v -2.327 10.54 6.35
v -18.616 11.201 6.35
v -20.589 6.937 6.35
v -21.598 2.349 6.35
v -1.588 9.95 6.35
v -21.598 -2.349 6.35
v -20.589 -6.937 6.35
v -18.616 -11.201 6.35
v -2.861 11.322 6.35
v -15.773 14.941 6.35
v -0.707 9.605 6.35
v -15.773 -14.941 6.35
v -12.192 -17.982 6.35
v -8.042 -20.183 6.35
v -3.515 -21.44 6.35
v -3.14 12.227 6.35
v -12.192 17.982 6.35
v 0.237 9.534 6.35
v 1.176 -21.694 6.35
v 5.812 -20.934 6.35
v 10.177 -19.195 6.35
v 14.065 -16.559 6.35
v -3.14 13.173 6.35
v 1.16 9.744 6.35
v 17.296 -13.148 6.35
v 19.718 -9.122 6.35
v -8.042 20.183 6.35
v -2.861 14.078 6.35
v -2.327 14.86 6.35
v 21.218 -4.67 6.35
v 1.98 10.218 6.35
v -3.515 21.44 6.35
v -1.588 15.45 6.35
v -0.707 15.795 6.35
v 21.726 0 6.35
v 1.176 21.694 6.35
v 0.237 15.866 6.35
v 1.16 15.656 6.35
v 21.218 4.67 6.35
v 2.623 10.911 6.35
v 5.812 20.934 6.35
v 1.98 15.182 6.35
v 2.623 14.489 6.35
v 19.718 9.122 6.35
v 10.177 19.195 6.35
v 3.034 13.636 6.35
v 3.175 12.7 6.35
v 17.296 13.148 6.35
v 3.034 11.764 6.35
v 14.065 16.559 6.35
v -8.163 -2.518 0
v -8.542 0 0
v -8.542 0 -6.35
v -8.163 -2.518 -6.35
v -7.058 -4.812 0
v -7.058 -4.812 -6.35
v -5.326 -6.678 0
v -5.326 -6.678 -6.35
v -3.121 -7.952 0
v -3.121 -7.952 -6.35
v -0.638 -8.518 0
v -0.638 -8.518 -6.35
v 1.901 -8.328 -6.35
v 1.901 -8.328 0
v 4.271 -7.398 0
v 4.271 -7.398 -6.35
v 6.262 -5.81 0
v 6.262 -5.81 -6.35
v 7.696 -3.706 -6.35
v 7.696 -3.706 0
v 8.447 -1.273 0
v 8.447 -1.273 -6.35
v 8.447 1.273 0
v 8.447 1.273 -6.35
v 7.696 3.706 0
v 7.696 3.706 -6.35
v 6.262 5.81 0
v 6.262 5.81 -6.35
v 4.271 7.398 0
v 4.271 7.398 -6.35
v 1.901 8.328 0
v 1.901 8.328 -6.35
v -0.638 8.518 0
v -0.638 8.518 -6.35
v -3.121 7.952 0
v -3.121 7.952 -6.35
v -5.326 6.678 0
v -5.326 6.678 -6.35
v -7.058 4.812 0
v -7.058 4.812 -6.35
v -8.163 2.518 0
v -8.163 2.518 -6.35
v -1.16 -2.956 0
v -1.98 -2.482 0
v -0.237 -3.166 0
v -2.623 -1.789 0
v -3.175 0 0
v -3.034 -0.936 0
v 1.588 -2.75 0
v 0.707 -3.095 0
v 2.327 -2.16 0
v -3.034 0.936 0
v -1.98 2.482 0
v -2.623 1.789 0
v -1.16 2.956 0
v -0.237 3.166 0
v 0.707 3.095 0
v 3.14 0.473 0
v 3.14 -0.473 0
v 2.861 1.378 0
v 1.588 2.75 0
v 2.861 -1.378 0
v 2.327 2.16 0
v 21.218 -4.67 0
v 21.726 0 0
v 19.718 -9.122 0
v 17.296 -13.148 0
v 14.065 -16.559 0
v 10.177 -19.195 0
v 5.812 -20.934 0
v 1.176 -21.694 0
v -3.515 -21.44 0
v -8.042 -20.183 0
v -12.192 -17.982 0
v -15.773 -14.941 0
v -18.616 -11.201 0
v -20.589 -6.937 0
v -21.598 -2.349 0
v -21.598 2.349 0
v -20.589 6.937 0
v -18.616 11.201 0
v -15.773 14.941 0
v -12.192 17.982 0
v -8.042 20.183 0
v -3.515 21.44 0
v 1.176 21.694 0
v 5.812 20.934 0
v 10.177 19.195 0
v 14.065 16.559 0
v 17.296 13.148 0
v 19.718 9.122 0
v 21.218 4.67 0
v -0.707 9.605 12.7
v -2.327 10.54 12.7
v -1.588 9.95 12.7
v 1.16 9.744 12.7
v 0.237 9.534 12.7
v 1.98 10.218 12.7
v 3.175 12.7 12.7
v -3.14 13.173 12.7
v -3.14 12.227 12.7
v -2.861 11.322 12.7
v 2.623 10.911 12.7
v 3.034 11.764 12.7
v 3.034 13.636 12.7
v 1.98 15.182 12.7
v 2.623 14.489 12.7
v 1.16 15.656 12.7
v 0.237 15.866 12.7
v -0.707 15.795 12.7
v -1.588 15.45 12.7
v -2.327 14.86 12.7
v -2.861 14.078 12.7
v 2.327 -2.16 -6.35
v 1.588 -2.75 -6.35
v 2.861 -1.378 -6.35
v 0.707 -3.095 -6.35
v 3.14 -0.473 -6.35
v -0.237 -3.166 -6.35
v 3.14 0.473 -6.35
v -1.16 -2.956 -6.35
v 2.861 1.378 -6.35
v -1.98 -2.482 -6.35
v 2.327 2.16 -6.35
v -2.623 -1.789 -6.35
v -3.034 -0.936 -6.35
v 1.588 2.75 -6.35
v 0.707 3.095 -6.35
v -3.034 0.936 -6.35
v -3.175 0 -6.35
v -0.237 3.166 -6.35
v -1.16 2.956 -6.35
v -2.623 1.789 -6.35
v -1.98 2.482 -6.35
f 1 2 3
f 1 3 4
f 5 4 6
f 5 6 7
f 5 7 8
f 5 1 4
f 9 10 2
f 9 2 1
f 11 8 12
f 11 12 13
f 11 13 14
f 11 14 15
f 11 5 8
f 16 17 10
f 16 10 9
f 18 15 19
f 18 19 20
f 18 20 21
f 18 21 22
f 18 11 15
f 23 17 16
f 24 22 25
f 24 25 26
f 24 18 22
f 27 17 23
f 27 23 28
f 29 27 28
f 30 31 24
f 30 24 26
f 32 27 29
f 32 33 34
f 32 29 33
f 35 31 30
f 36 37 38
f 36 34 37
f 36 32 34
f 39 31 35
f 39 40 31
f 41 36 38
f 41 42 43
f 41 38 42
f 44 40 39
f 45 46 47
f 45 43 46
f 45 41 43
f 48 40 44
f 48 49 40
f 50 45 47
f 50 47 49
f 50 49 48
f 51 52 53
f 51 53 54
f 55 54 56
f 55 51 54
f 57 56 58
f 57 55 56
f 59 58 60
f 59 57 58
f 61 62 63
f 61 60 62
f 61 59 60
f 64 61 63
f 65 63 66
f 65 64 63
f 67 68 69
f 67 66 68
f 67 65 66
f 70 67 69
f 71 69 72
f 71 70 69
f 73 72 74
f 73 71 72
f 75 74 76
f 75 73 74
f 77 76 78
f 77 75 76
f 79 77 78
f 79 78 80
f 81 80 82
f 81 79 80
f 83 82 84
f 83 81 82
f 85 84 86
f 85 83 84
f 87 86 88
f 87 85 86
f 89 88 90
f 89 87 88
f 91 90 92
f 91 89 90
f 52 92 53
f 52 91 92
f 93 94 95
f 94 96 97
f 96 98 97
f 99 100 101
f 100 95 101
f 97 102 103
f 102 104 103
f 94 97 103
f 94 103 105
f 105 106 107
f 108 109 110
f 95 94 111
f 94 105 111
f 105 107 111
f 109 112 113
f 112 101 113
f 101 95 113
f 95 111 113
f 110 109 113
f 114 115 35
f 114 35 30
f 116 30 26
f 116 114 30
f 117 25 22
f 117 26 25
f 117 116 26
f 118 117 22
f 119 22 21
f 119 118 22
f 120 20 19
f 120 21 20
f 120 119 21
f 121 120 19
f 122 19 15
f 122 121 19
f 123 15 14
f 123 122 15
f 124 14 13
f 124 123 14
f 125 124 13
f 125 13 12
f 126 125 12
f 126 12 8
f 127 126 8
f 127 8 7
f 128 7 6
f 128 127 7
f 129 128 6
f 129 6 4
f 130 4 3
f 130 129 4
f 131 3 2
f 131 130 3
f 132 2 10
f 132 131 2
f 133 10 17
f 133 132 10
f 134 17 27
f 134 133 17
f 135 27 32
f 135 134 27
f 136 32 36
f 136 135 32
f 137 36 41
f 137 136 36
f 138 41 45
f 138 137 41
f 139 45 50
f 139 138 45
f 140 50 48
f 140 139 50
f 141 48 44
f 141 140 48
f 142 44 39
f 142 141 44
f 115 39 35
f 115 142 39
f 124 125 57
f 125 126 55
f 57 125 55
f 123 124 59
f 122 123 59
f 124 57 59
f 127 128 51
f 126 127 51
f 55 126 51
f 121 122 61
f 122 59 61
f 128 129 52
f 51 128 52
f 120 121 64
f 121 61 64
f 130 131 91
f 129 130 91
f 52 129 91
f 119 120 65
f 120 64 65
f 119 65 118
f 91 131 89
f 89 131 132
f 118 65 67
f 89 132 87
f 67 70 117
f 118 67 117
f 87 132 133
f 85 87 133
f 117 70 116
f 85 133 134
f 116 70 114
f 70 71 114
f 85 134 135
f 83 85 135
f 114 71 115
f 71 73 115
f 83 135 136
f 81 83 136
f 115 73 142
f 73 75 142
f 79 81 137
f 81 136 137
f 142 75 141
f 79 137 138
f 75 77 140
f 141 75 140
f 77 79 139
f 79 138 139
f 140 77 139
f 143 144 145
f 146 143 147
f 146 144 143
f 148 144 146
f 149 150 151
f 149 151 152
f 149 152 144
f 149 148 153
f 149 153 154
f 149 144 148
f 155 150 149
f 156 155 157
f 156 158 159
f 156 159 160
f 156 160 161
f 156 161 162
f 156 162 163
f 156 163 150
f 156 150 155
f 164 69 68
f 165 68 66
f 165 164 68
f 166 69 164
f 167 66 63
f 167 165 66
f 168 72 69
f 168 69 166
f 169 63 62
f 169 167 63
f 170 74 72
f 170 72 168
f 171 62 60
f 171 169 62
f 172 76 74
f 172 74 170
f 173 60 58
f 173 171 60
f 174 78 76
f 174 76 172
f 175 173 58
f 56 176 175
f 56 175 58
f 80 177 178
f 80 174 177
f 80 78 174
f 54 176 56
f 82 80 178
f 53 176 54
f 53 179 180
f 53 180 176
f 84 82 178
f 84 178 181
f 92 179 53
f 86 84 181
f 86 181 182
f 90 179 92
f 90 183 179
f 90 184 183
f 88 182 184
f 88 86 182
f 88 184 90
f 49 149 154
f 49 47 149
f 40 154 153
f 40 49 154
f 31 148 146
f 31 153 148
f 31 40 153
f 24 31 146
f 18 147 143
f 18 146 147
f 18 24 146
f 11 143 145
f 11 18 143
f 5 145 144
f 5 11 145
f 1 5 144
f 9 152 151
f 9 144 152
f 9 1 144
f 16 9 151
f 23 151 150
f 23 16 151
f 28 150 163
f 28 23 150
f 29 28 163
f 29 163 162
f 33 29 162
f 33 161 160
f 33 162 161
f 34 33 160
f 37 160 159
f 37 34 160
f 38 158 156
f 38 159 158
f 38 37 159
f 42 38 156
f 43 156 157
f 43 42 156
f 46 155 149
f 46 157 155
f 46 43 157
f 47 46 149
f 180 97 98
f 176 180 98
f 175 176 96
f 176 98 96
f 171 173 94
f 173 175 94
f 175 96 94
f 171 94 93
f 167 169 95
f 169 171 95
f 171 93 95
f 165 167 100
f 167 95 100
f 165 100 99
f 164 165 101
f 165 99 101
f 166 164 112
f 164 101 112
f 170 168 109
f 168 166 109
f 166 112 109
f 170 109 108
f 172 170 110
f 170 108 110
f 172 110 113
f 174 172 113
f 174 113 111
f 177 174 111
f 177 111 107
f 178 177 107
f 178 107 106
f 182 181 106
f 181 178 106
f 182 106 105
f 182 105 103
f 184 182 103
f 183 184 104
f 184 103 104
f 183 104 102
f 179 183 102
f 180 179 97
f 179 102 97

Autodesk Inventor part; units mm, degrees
ref_plane "XZ Plane" through (0, 0, 0) normal (0, 1, 0) x (-1, 0, 0)
ref_plane "XY Plane" through (0, 0, 0) normal (0, 0, 1) x (1, 0, 0)
sketch "Sketch1" plane through (0, 0, 0) normal (0, 0, 1) x (1, 0, 0)
  circle A0 centre (0, 0) radius 21.7258
extrude "Extrusion1" add sketch "Sketch1" along normal blind 6.35
sketch "Sketch2" plane through (0, 0, 6.35) normal (0, 0, 1) x (1, 0, 0)
  circle A0 centre (0, 12.7) radius 3.175
  point P0 (0, 0)
  dimension "d4" = 6.35
extrude "Extrusion2" add sketch "Sketch2" along normal blind 6.35
sketch "Sketch5" plane through (0, 0, 0) normal (0, 0, -1) x (-1, 0, 0)
  circle A0 centre (0, 0) radius 3.175
  circle A1 centre (0, 0) radius 8.542
  point P0 (0, 0)
ref_plane "Work Plane3" through (0, 0, -6.35) normal (0, 0, -1) x (-1, 0, 0)
extrude "Extrusion5" add sketch "Sketch5" along normal blind 6.35
sketch "Sketch6" plane through (0, 0, -6.35) normal (0, 0, -1) x (-1, 0, 0)
  circle A0 centre (0, 0) radius 3.175
  spline S0 degree 4 poles (-15.875, 0) (-15.875, 5.123) (-15.6795, 13.2839) (0.7771, 27.615) (13.6923, 12.2077) (15.875, 5.0189) (15.875, 0) knots -1 -1 -1 -1 -1 -0.623021 -0.373021 0 0 0 0 0
  spline S1 degree 4 poles (15.875, 0) (15.875, -4.6644) (10.9112, -18.4609) (-6.6696, -14.611) (-16.1915, -10.8158) (-15.875, 0) knots -1 -1 -1 -1 -1 -0.624992 0 0 0 0 0
  point P0 (0, 0)
extrude "Extrusion4" [suppressed]
sketch "Sketch7" plane through (0, 0, -12.7) normal (0, 0, -1) x (-1, 0, 0)
  circle A0 centre (0, 0) radius 3.175 projected
  point P0 (0, 0)
  point P1 (15.875, 0)
  point P2 (-15.875, 0)
properties part number "Eccentric" material "Steel"
